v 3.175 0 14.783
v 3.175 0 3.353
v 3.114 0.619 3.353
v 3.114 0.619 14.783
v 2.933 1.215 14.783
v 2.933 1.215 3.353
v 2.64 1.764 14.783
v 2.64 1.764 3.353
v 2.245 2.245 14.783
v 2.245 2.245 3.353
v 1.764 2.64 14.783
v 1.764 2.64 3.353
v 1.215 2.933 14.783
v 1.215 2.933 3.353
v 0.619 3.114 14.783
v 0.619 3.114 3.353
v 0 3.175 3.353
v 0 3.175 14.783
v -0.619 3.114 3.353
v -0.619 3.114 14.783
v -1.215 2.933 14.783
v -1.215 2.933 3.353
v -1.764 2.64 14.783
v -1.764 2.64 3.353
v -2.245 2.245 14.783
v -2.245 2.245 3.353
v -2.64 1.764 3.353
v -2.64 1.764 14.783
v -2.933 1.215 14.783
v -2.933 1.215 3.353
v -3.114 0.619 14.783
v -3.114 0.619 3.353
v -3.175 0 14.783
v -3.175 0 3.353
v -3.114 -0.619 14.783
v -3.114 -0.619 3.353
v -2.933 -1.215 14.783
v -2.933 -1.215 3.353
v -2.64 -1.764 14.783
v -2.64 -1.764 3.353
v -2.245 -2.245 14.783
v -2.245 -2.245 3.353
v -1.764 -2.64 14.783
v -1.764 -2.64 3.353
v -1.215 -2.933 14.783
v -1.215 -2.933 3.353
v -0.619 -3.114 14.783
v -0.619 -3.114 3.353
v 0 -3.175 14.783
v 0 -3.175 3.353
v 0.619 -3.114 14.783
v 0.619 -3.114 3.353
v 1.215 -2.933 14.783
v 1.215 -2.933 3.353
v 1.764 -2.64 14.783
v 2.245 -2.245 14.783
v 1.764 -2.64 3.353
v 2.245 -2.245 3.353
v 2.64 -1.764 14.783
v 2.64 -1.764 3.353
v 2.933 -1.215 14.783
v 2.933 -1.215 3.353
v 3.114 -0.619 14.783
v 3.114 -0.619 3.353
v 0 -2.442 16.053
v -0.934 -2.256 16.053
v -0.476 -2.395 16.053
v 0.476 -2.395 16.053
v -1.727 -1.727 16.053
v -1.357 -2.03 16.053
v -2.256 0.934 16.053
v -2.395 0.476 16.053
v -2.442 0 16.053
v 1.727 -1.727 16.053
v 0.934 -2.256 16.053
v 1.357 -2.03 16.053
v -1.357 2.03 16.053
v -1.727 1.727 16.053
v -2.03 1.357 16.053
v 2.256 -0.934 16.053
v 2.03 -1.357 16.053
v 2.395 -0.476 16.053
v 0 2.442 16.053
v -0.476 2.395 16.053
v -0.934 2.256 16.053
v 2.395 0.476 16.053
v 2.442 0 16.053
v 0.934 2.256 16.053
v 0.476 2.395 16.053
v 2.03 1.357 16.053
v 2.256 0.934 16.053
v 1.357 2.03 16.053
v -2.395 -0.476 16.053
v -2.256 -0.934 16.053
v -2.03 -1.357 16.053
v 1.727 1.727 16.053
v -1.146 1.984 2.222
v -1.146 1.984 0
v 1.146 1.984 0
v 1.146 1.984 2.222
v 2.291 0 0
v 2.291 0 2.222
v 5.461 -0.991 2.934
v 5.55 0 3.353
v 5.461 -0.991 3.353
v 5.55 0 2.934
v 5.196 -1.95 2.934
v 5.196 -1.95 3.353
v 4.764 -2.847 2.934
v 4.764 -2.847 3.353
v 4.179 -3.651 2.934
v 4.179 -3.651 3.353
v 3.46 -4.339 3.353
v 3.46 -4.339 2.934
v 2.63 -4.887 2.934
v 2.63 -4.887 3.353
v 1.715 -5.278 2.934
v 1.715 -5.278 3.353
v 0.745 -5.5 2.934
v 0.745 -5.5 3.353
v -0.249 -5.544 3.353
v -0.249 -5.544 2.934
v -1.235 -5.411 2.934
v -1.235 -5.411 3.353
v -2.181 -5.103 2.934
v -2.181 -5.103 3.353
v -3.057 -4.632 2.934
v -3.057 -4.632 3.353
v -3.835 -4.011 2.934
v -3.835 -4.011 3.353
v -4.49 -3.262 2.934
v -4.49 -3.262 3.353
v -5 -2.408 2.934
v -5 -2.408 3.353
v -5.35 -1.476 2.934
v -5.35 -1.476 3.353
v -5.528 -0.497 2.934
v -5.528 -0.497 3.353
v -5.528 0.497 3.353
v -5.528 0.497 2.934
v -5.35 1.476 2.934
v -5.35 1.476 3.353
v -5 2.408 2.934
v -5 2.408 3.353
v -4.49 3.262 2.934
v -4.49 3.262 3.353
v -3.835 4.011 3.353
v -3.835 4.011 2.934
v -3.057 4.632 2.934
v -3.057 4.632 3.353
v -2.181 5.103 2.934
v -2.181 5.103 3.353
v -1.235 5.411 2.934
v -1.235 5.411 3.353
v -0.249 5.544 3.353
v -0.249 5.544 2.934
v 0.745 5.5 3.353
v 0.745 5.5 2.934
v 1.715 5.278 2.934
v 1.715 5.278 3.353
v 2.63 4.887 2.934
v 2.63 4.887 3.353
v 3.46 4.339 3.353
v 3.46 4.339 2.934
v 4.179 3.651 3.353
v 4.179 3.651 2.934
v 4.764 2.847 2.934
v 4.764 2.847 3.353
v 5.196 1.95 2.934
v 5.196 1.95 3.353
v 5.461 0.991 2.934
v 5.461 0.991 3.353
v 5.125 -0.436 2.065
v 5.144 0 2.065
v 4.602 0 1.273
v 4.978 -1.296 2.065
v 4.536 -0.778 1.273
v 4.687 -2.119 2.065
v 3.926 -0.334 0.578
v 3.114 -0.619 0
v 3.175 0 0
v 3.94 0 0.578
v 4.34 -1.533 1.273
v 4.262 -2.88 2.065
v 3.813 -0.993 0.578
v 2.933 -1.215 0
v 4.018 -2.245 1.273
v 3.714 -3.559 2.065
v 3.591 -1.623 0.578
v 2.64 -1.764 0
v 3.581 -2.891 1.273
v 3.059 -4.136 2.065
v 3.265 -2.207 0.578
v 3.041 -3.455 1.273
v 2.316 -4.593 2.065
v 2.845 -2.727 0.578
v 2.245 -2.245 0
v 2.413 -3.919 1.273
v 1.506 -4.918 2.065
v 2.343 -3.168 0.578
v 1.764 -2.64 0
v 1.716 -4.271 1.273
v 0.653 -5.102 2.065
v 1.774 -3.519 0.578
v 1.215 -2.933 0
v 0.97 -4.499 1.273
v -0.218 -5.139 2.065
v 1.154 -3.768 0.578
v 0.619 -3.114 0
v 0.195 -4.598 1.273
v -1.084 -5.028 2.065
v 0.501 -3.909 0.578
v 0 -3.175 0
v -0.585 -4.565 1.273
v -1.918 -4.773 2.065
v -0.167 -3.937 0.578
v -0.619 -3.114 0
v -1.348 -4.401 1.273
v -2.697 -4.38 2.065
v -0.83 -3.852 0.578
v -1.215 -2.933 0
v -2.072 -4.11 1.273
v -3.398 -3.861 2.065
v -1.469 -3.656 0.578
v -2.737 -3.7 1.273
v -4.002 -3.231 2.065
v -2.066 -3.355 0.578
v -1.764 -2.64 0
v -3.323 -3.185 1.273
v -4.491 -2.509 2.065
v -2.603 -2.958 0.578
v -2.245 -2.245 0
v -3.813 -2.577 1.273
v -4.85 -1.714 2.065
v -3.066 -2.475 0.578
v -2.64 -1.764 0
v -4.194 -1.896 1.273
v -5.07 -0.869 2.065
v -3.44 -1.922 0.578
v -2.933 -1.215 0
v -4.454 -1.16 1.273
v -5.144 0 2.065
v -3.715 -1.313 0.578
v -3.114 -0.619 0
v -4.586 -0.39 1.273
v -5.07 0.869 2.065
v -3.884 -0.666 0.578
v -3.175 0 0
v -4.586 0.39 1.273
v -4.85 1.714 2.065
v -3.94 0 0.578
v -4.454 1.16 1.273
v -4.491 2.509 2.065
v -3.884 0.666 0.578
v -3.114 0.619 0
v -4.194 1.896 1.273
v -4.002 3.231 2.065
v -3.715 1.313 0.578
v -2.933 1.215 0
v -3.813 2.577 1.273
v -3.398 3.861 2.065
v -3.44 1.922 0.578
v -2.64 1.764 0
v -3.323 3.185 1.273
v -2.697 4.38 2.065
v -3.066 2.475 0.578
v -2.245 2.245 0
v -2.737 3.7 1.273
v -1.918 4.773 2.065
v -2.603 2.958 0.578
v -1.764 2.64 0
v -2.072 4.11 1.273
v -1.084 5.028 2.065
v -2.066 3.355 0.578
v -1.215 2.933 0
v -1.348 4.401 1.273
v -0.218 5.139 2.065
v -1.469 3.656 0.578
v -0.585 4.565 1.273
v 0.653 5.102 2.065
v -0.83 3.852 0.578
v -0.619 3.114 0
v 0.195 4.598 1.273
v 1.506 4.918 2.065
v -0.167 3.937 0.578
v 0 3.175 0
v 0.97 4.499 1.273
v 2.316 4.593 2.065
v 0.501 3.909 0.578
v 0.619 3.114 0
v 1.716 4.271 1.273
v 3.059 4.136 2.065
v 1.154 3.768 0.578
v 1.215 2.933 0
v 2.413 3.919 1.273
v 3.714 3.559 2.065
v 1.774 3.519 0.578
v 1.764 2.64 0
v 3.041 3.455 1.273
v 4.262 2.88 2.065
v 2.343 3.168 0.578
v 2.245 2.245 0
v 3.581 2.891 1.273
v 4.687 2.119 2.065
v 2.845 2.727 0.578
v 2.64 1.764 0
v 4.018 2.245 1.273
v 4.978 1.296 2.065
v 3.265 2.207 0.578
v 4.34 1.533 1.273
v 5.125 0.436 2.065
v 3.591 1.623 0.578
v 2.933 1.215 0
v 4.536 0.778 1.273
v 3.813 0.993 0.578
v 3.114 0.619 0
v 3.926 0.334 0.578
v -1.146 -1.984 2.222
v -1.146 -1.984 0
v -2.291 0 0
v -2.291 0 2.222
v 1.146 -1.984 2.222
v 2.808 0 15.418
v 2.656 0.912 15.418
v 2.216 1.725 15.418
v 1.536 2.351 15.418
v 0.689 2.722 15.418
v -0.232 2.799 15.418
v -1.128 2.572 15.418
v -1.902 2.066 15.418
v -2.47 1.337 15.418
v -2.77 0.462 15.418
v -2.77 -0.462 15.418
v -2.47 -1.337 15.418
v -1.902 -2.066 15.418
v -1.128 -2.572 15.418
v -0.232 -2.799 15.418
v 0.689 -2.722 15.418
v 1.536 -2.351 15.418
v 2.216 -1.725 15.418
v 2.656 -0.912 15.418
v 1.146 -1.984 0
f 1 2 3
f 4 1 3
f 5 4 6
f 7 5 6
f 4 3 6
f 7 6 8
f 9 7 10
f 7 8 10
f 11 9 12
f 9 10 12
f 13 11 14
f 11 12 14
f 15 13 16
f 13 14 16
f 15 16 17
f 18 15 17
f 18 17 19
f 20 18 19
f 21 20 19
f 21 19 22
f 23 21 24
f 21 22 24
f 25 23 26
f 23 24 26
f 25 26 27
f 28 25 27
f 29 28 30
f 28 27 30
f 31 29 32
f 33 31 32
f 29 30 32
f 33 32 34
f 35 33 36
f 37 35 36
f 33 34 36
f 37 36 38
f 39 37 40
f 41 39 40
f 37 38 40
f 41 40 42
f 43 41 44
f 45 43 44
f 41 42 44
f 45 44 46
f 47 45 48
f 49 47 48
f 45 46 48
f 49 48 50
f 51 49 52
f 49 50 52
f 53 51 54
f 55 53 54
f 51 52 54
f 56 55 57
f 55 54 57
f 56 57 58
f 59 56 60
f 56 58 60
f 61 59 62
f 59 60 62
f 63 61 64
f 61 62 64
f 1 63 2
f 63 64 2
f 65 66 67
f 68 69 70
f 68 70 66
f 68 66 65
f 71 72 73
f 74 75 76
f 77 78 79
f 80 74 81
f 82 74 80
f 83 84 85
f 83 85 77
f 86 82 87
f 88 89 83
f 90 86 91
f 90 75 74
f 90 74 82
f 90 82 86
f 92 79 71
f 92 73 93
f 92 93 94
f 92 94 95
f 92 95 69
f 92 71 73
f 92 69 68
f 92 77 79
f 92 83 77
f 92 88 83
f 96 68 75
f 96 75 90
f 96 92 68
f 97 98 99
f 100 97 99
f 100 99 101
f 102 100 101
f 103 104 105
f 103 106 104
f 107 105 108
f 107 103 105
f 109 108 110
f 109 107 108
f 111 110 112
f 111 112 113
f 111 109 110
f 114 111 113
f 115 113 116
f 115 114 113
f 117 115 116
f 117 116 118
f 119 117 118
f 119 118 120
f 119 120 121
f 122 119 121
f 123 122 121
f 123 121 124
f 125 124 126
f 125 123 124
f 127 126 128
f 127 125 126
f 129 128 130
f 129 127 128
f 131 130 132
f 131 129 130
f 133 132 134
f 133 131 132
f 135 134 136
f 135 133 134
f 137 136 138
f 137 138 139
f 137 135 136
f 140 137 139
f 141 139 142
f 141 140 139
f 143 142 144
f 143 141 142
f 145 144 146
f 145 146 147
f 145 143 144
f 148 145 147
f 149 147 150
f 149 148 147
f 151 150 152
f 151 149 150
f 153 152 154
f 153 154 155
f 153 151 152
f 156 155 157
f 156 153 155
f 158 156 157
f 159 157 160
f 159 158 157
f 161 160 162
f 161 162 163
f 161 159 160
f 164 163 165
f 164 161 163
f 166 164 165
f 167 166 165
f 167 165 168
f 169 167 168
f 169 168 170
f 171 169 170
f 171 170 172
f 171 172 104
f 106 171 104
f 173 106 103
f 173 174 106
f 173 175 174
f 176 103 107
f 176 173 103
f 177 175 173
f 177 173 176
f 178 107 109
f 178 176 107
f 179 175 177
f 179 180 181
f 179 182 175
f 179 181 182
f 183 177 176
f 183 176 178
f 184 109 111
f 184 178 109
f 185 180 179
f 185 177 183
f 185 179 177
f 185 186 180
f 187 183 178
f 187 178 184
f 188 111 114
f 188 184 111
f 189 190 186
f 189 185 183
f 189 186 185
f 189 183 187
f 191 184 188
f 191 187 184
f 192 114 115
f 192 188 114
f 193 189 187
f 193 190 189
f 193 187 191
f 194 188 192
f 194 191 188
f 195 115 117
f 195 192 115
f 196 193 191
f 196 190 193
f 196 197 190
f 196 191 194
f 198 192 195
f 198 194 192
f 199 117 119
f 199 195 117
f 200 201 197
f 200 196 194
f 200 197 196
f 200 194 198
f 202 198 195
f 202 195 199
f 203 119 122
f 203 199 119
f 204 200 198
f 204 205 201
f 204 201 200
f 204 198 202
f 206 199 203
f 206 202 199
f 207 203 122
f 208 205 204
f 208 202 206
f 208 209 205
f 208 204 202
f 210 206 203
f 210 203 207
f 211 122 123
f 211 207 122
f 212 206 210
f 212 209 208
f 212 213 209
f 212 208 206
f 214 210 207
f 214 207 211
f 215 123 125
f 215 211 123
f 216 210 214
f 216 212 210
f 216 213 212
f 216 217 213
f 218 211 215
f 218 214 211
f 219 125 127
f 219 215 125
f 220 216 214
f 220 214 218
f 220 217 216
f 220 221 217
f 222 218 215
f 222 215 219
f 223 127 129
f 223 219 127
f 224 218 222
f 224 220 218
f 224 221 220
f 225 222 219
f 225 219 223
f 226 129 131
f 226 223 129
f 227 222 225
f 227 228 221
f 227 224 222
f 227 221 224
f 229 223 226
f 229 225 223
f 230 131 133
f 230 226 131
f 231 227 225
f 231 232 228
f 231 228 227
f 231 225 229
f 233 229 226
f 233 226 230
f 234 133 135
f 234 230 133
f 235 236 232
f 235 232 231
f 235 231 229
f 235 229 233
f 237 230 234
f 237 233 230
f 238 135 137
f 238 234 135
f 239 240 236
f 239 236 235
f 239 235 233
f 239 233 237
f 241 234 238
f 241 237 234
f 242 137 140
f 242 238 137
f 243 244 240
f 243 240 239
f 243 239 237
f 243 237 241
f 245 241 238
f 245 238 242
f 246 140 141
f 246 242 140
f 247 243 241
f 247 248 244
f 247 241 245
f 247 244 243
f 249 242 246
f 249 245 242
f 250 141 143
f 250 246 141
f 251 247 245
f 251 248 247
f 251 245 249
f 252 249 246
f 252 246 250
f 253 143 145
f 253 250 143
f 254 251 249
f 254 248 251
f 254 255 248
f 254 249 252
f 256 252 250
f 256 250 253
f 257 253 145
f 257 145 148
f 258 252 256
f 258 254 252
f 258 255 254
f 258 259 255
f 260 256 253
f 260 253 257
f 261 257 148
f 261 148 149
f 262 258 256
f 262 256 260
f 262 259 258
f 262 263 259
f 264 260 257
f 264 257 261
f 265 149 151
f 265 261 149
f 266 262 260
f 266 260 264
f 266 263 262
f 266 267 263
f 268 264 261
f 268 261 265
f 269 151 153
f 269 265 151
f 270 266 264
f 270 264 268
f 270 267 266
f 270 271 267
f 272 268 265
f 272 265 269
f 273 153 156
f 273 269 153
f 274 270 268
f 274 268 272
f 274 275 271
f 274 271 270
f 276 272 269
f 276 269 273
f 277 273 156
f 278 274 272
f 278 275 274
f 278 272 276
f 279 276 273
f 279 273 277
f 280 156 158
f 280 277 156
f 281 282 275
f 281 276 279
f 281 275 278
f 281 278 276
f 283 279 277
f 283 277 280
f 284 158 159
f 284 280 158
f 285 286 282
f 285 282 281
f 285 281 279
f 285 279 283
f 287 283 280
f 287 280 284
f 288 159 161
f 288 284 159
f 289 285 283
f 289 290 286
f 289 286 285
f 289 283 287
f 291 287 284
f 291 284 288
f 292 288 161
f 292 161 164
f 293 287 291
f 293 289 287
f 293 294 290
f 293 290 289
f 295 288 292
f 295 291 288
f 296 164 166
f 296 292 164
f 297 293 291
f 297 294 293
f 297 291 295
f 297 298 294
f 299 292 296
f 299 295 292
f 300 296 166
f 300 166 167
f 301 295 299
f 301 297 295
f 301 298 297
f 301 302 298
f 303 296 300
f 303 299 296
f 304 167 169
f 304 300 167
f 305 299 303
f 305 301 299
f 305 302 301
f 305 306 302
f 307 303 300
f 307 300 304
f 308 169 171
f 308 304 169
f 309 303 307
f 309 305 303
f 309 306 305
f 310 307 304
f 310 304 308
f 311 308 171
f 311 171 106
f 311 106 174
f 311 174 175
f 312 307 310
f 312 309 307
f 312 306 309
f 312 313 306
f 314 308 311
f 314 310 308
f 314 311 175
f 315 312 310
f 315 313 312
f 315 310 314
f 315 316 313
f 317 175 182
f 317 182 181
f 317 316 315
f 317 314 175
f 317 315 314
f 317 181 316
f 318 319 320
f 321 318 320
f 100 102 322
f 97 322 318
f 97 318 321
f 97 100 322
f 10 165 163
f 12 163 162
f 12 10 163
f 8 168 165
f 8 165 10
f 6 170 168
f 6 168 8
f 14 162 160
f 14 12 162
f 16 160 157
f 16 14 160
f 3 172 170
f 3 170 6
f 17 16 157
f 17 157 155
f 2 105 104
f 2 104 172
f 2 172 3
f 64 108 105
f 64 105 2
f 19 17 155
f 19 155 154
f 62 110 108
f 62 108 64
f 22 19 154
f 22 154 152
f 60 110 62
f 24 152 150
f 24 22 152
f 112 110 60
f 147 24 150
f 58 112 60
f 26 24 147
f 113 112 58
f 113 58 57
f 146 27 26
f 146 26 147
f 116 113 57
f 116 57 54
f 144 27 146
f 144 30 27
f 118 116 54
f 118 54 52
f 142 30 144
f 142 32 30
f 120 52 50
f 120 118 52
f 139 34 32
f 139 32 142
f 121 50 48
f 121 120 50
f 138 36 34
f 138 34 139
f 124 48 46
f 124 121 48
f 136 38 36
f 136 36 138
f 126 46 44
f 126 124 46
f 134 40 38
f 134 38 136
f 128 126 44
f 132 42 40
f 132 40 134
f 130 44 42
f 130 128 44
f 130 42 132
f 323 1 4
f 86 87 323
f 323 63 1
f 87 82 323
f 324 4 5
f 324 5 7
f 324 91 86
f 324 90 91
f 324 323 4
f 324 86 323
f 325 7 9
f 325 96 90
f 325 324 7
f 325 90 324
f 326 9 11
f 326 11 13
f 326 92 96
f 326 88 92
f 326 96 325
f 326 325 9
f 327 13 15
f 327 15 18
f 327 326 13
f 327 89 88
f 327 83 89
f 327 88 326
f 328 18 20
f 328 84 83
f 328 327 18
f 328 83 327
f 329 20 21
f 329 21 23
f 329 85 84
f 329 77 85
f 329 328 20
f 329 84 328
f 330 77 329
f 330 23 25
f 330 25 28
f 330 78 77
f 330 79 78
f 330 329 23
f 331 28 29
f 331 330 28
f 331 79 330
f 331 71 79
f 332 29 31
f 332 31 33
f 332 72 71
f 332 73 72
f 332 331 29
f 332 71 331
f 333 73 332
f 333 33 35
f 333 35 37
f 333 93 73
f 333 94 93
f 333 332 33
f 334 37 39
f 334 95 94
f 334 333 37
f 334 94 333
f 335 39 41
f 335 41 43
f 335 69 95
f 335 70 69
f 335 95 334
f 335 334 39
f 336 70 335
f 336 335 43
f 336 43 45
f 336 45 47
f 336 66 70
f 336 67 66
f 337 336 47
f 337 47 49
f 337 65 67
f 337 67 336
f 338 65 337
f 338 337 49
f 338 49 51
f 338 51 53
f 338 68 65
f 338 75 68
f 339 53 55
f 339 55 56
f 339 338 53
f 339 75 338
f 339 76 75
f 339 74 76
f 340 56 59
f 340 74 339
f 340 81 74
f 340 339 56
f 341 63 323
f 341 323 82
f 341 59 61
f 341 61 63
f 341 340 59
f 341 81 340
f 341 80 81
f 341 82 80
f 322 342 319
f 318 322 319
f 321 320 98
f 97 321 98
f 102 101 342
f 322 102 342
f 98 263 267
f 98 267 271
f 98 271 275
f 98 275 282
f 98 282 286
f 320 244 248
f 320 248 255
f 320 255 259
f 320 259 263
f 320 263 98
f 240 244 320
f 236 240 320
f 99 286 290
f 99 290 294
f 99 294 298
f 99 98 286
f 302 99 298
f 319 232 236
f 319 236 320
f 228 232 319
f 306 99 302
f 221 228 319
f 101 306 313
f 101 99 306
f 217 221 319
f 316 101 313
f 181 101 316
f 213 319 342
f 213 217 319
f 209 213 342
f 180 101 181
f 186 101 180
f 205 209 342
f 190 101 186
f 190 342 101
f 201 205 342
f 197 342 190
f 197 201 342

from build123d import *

# Parameters (mm, degrees)
CUT_EXTRUDE1_DEPTH  = 2.2225
SKETCH3_R           = 3.175
BOSS_EXTRUDE1_DEPTH = 12.7
CHAMFER1_SIZE       = 1.27
CHAMFER1_SIZE2      = 0.733234842


with BuildPart() as part:
    # Sketch1 → Revolve1 (revolve)
    with BuildSketch(Plane(origin=(0, 0, 0), x_dir=(1, 0, 0), z_dir=(0, 1, 0))):
        with BuildLine():
            Line((5.549899963, -3.3528), (5.549899963, -2.933699945))
            ThreePointArc((5.549899963, -2.933699945), (4.602457888, -1.27255785), (3.174999986, 0))
            Line((3.174999986, 0), (-1.6e-08, 0))
            Line((-1.6e-08, 0), (-1.6e-08, -3.3528))
            Line((-1.6e-08, -3.3528), (5.549899963, -3.3528))
        make_face()
    revolve(axis=Axis((-1.6e-08, 0, 0), (0, 0, -1)))

    # Sketch2 → Cut-Extrude1 (cut)
    with BuildSketch(Plane(origin=(0, 0, 0), x_dir=(-1, 0, 0), z_dir=(0, 0, -1))):
        Polygon((2.291358881, 0), (1.14567944, 1.984375), (-1.14567944, 1.984375), (-2.291358881, 0), (-1.14567944, -1.984375), (1.14567944, -1.984375), align=None)
    extrude(amount=-CUT_EXTRUDE1_DEPTH, mode=Mode.SUBTRACT)

    # Sketch3 → Boss-Extrude1 (add)
    with BuildSketch(Plane.XY.offset(3.3528)):
        Circle(SKETCH3_R)
    extrude(amount=BOSS_EXTRUDE1_DEPTH)

    # Chamfer1
    chamfer1_edges = [part.edges().sort_by_distance(p)[0] for p in [
        (-3.175, 0, 16.0528),
    ]]
    chamfer1_side = [part.faces().sort_by_distance(p)[0] for p in [
        (-3.175, 0, 9.7028),
    ]]
    chamfer(chamfer1_edges, length=CHAMFER1_SIZE, length2=CHAMFER1_SIZE2, reference=chamfer1_side[0])


solid = part.part
